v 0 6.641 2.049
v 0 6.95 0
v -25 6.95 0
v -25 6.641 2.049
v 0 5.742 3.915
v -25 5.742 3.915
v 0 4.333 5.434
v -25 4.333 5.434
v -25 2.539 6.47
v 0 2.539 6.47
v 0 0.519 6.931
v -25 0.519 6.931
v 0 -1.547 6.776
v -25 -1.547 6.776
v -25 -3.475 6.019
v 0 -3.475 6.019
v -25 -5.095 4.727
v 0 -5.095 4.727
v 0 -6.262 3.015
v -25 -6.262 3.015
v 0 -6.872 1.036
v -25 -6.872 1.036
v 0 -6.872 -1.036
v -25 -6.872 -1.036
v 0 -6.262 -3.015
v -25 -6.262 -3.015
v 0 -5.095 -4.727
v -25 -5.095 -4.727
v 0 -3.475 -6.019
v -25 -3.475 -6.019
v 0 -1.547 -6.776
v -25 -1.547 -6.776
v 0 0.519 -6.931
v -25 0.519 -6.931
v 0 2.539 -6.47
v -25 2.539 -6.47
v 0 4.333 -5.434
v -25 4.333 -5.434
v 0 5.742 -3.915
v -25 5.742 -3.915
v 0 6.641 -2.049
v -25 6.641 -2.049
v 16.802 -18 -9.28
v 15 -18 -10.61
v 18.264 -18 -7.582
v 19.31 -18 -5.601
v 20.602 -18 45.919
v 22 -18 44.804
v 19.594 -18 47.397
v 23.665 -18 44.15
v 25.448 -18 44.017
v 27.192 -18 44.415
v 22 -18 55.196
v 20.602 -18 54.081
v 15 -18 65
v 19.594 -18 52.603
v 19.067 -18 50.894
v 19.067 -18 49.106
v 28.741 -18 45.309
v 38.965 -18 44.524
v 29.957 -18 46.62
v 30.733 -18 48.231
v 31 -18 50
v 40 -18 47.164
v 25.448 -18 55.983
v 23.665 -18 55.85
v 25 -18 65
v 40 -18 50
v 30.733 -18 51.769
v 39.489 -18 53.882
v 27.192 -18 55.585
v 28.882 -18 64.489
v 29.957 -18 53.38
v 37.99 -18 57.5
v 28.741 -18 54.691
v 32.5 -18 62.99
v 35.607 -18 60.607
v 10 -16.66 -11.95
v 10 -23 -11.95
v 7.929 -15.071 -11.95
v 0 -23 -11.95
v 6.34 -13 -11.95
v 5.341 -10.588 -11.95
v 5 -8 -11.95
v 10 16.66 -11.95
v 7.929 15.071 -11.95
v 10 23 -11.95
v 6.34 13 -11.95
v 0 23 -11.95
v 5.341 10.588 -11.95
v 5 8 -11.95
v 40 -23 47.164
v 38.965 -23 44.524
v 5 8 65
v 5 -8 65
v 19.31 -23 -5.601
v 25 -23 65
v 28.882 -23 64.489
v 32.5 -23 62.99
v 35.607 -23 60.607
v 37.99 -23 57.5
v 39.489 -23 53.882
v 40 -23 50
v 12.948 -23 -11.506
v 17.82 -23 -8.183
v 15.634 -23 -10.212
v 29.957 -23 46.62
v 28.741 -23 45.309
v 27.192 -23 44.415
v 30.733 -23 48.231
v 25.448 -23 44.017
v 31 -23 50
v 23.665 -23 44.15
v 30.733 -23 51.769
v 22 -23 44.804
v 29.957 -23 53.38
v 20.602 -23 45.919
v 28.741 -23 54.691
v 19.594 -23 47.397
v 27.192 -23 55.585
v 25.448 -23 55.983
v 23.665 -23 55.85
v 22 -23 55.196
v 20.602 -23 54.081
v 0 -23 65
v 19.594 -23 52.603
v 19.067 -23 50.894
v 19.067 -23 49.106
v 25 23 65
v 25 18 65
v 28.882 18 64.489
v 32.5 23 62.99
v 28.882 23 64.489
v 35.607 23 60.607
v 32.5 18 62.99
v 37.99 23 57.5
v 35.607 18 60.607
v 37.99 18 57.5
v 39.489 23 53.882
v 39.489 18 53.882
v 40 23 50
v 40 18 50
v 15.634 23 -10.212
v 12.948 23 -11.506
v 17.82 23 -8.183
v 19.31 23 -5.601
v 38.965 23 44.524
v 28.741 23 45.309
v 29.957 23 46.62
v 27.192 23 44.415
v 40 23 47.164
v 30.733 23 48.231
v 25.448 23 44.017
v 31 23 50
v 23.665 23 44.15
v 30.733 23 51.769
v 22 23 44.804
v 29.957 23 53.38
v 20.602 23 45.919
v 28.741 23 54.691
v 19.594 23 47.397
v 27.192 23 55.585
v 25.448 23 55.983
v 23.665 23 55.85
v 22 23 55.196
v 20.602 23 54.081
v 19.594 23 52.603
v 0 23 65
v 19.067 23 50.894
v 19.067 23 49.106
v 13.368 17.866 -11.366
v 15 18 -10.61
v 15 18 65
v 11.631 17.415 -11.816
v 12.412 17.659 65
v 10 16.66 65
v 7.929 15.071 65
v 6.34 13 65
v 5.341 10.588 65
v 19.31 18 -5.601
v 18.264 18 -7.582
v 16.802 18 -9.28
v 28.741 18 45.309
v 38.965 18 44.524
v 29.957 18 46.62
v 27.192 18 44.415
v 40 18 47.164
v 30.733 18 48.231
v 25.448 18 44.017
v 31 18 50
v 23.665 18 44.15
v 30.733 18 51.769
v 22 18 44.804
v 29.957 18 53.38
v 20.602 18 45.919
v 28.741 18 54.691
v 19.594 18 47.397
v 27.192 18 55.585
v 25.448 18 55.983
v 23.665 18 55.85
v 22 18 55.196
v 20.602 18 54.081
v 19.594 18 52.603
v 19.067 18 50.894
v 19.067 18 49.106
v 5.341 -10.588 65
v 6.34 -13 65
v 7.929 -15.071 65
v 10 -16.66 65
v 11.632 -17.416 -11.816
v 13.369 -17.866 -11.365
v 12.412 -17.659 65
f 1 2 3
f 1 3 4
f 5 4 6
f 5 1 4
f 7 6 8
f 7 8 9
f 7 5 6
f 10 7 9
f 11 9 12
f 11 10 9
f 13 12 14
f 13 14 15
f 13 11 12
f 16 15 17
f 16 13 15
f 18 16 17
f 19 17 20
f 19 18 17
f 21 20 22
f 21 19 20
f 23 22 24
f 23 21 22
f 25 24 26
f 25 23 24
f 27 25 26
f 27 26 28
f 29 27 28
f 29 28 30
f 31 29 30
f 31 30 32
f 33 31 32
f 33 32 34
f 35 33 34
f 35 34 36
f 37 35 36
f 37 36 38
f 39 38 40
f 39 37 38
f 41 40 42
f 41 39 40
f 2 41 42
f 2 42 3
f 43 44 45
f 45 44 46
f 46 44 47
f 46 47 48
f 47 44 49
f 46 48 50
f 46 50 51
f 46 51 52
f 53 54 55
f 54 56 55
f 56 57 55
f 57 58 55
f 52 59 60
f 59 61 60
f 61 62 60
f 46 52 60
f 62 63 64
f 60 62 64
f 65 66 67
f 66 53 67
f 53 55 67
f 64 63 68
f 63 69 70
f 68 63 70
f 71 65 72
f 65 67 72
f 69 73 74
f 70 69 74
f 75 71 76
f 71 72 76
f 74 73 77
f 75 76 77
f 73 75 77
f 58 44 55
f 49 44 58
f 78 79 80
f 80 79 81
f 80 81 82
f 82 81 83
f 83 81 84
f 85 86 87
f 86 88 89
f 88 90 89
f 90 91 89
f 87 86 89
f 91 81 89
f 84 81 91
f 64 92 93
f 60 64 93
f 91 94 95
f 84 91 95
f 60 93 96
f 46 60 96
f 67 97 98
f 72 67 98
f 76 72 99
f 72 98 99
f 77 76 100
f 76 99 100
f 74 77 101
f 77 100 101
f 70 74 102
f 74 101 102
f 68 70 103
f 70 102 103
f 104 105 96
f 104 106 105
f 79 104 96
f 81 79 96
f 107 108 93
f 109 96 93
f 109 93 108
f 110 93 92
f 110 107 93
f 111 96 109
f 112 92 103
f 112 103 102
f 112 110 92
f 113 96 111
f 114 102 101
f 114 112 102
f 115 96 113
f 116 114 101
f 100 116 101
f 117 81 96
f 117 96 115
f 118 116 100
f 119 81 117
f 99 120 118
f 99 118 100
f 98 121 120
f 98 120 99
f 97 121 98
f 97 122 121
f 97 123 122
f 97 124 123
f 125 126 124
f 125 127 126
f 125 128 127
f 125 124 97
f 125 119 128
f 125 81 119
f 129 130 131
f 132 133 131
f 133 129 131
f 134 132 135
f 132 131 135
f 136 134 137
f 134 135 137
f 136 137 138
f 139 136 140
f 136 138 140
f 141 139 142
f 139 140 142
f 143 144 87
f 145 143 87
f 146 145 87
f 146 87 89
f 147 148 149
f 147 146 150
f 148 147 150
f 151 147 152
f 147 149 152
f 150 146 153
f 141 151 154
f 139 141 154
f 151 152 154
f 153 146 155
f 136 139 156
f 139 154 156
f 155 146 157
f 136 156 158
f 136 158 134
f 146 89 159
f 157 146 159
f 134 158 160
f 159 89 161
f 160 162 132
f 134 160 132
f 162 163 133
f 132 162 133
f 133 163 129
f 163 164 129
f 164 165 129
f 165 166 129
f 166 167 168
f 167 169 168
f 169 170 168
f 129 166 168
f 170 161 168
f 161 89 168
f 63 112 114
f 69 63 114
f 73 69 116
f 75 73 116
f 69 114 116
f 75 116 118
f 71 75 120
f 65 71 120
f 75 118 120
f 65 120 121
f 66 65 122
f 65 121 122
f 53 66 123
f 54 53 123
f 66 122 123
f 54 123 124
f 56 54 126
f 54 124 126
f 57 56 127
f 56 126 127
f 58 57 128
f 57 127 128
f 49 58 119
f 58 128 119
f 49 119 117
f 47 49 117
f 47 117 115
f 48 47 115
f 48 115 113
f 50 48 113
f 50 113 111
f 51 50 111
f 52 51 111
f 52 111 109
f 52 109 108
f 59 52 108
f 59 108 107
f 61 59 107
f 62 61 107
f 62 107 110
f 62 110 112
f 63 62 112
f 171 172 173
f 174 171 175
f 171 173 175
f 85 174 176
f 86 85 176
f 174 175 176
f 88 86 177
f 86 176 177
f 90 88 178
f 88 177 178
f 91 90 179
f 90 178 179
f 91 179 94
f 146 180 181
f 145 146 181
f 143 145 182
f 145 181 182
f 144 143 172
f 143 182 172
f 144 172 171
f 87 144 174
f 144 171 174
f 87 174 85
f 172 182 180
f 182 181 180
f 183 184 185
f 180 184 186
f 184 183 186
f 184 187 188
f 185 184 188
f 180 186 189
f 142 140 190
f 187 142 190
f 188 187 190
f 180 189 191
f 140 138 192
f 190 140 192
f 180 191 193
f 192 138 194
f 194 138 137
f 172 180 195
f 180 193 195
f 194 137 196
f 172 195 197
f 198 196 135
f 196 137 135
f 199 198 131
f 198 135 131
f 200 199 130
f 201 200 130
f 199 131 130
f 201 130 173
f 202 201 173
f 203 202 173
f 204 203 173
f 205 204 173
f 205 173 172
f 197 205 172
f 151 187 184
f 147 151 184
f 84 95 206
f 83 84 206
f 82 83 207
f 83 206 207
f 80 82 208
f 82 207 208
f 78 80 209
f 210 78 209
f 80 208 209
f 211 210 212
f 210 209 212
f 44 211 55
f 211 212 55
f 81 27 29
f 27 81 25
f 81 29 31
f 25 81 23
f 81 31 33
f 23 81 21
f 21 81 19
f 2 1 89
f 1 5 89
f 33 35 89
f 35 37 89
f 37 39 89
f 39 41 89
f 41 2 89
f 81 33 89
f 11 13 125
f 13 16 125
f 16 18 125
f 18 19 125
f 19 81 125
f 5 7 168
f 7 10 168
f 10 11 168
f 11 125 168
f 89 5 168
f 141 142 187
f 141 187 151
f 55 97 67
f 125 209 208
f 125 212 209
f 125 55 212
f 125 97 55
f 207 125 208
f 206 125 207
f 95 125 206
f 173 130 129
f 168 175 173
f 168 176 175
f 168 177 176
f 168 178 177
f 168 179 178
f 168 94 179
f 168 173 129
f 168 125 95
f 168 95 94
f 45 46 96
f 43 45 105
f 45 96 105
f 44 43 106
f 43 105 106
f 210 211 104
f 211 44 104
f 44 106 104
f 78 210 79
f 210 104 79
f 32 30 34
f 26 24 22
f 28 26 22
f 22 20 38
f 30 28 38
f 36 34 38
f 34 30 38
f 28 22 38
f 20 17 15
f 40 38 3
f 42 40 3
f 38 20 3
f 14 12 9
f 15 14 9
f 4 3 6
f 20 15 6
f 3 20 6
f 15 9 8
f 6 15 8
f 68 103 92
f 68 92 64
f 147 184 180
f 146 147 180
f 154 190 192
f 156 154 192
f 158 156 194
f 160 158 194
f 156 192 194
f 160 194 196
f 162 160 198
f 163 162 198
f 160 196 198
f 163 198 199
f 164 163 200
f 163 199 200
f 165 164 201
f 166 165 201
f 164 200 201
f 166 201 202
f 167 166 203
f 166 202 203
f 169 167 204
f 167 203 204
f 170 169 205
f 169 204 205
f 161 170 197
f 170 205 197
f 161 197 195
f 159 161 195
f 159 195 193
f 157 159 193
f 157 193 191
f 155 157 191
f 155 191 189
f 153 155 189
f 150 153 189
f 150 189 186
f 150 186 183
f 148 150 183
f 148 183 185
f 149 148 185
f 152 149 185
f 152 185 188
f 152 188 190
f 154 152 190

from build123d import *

# Parameters (mm, degrees)
F0_R     = 6.95
F1_DEPTH = 25
F2_W     = 46
F2_H     = 76.95
F2_R     = 6.95
F3_DEPTH = 40
F5_DEPTH = 76.951
F6_R     = 6
F7_DEPTH = 46.001


with BuildPart() as f1:
    # F0 (on Right) → F1 (new body)
    with BuildSketch(Plane.YZ):
        Circle(F0_R)
    extrude(amount=-F1_DEPTH)

    # F2 (on Right) → F3 (join)
    with BuildSketch(Plane.YZ):
        with Locations((0, 26.525)):
            Rectangle(F2_W, F2_H)
        Circle(F2_R, mode=Mode.SUBTRACT)
        Circle(F2_R)
    extrude(amount=F3_DEPTH)

    # F4 (on face) → F5 (cut, through all)
    with BuildSketch(Plane.XY.offset(65)):
        with BuildLine():
            Line((40, -18), (40, 18))
            Line((40, 18), (15, 18))
            ThreePointArc((15, 18), (7.928932, 15.071068), (5, 8))
            Line((5, 8), (5, -8))
            ThreePointArc((5, -8), (7.928932, -15.071068), (15, -18))
            Line((15, -18), (40, -18))
        make_face()
    extrude(amount=-F5_DEPTH, mode=Mode.SUBTRACT)

    # F6 (on face) → F7 (cut, through all)
    with BuildSketch(Plane.XZ.offset(23)):
        with BuildLine():
            Line((40, 50), (40, 65))
            Line((40, 65), (25, 65))
            ThreePointArc((25, 65), (35.606602, 60.606602), (40, 50))
        make_face()
        with BuildLine():
            Line((40, -11.95), (40, 47.164207))
            Line((40, 47.164207), (38.964771, 44.524128))
            Line((38.964771, 44.524128), (19.309847, -5.600581))
            ThreePointArc((19.309847, -5.600581), (15.634456, -10.211532), (10, -11.95))
            Line((10, -11.95), (40, -11.95))
        make_face()
        with Locations((25, 50)):
            Circle(F6_R)
    extrude(amount=-F7_DEPTH, mode=Mode.SUBTRACT)


solid = f1.part
